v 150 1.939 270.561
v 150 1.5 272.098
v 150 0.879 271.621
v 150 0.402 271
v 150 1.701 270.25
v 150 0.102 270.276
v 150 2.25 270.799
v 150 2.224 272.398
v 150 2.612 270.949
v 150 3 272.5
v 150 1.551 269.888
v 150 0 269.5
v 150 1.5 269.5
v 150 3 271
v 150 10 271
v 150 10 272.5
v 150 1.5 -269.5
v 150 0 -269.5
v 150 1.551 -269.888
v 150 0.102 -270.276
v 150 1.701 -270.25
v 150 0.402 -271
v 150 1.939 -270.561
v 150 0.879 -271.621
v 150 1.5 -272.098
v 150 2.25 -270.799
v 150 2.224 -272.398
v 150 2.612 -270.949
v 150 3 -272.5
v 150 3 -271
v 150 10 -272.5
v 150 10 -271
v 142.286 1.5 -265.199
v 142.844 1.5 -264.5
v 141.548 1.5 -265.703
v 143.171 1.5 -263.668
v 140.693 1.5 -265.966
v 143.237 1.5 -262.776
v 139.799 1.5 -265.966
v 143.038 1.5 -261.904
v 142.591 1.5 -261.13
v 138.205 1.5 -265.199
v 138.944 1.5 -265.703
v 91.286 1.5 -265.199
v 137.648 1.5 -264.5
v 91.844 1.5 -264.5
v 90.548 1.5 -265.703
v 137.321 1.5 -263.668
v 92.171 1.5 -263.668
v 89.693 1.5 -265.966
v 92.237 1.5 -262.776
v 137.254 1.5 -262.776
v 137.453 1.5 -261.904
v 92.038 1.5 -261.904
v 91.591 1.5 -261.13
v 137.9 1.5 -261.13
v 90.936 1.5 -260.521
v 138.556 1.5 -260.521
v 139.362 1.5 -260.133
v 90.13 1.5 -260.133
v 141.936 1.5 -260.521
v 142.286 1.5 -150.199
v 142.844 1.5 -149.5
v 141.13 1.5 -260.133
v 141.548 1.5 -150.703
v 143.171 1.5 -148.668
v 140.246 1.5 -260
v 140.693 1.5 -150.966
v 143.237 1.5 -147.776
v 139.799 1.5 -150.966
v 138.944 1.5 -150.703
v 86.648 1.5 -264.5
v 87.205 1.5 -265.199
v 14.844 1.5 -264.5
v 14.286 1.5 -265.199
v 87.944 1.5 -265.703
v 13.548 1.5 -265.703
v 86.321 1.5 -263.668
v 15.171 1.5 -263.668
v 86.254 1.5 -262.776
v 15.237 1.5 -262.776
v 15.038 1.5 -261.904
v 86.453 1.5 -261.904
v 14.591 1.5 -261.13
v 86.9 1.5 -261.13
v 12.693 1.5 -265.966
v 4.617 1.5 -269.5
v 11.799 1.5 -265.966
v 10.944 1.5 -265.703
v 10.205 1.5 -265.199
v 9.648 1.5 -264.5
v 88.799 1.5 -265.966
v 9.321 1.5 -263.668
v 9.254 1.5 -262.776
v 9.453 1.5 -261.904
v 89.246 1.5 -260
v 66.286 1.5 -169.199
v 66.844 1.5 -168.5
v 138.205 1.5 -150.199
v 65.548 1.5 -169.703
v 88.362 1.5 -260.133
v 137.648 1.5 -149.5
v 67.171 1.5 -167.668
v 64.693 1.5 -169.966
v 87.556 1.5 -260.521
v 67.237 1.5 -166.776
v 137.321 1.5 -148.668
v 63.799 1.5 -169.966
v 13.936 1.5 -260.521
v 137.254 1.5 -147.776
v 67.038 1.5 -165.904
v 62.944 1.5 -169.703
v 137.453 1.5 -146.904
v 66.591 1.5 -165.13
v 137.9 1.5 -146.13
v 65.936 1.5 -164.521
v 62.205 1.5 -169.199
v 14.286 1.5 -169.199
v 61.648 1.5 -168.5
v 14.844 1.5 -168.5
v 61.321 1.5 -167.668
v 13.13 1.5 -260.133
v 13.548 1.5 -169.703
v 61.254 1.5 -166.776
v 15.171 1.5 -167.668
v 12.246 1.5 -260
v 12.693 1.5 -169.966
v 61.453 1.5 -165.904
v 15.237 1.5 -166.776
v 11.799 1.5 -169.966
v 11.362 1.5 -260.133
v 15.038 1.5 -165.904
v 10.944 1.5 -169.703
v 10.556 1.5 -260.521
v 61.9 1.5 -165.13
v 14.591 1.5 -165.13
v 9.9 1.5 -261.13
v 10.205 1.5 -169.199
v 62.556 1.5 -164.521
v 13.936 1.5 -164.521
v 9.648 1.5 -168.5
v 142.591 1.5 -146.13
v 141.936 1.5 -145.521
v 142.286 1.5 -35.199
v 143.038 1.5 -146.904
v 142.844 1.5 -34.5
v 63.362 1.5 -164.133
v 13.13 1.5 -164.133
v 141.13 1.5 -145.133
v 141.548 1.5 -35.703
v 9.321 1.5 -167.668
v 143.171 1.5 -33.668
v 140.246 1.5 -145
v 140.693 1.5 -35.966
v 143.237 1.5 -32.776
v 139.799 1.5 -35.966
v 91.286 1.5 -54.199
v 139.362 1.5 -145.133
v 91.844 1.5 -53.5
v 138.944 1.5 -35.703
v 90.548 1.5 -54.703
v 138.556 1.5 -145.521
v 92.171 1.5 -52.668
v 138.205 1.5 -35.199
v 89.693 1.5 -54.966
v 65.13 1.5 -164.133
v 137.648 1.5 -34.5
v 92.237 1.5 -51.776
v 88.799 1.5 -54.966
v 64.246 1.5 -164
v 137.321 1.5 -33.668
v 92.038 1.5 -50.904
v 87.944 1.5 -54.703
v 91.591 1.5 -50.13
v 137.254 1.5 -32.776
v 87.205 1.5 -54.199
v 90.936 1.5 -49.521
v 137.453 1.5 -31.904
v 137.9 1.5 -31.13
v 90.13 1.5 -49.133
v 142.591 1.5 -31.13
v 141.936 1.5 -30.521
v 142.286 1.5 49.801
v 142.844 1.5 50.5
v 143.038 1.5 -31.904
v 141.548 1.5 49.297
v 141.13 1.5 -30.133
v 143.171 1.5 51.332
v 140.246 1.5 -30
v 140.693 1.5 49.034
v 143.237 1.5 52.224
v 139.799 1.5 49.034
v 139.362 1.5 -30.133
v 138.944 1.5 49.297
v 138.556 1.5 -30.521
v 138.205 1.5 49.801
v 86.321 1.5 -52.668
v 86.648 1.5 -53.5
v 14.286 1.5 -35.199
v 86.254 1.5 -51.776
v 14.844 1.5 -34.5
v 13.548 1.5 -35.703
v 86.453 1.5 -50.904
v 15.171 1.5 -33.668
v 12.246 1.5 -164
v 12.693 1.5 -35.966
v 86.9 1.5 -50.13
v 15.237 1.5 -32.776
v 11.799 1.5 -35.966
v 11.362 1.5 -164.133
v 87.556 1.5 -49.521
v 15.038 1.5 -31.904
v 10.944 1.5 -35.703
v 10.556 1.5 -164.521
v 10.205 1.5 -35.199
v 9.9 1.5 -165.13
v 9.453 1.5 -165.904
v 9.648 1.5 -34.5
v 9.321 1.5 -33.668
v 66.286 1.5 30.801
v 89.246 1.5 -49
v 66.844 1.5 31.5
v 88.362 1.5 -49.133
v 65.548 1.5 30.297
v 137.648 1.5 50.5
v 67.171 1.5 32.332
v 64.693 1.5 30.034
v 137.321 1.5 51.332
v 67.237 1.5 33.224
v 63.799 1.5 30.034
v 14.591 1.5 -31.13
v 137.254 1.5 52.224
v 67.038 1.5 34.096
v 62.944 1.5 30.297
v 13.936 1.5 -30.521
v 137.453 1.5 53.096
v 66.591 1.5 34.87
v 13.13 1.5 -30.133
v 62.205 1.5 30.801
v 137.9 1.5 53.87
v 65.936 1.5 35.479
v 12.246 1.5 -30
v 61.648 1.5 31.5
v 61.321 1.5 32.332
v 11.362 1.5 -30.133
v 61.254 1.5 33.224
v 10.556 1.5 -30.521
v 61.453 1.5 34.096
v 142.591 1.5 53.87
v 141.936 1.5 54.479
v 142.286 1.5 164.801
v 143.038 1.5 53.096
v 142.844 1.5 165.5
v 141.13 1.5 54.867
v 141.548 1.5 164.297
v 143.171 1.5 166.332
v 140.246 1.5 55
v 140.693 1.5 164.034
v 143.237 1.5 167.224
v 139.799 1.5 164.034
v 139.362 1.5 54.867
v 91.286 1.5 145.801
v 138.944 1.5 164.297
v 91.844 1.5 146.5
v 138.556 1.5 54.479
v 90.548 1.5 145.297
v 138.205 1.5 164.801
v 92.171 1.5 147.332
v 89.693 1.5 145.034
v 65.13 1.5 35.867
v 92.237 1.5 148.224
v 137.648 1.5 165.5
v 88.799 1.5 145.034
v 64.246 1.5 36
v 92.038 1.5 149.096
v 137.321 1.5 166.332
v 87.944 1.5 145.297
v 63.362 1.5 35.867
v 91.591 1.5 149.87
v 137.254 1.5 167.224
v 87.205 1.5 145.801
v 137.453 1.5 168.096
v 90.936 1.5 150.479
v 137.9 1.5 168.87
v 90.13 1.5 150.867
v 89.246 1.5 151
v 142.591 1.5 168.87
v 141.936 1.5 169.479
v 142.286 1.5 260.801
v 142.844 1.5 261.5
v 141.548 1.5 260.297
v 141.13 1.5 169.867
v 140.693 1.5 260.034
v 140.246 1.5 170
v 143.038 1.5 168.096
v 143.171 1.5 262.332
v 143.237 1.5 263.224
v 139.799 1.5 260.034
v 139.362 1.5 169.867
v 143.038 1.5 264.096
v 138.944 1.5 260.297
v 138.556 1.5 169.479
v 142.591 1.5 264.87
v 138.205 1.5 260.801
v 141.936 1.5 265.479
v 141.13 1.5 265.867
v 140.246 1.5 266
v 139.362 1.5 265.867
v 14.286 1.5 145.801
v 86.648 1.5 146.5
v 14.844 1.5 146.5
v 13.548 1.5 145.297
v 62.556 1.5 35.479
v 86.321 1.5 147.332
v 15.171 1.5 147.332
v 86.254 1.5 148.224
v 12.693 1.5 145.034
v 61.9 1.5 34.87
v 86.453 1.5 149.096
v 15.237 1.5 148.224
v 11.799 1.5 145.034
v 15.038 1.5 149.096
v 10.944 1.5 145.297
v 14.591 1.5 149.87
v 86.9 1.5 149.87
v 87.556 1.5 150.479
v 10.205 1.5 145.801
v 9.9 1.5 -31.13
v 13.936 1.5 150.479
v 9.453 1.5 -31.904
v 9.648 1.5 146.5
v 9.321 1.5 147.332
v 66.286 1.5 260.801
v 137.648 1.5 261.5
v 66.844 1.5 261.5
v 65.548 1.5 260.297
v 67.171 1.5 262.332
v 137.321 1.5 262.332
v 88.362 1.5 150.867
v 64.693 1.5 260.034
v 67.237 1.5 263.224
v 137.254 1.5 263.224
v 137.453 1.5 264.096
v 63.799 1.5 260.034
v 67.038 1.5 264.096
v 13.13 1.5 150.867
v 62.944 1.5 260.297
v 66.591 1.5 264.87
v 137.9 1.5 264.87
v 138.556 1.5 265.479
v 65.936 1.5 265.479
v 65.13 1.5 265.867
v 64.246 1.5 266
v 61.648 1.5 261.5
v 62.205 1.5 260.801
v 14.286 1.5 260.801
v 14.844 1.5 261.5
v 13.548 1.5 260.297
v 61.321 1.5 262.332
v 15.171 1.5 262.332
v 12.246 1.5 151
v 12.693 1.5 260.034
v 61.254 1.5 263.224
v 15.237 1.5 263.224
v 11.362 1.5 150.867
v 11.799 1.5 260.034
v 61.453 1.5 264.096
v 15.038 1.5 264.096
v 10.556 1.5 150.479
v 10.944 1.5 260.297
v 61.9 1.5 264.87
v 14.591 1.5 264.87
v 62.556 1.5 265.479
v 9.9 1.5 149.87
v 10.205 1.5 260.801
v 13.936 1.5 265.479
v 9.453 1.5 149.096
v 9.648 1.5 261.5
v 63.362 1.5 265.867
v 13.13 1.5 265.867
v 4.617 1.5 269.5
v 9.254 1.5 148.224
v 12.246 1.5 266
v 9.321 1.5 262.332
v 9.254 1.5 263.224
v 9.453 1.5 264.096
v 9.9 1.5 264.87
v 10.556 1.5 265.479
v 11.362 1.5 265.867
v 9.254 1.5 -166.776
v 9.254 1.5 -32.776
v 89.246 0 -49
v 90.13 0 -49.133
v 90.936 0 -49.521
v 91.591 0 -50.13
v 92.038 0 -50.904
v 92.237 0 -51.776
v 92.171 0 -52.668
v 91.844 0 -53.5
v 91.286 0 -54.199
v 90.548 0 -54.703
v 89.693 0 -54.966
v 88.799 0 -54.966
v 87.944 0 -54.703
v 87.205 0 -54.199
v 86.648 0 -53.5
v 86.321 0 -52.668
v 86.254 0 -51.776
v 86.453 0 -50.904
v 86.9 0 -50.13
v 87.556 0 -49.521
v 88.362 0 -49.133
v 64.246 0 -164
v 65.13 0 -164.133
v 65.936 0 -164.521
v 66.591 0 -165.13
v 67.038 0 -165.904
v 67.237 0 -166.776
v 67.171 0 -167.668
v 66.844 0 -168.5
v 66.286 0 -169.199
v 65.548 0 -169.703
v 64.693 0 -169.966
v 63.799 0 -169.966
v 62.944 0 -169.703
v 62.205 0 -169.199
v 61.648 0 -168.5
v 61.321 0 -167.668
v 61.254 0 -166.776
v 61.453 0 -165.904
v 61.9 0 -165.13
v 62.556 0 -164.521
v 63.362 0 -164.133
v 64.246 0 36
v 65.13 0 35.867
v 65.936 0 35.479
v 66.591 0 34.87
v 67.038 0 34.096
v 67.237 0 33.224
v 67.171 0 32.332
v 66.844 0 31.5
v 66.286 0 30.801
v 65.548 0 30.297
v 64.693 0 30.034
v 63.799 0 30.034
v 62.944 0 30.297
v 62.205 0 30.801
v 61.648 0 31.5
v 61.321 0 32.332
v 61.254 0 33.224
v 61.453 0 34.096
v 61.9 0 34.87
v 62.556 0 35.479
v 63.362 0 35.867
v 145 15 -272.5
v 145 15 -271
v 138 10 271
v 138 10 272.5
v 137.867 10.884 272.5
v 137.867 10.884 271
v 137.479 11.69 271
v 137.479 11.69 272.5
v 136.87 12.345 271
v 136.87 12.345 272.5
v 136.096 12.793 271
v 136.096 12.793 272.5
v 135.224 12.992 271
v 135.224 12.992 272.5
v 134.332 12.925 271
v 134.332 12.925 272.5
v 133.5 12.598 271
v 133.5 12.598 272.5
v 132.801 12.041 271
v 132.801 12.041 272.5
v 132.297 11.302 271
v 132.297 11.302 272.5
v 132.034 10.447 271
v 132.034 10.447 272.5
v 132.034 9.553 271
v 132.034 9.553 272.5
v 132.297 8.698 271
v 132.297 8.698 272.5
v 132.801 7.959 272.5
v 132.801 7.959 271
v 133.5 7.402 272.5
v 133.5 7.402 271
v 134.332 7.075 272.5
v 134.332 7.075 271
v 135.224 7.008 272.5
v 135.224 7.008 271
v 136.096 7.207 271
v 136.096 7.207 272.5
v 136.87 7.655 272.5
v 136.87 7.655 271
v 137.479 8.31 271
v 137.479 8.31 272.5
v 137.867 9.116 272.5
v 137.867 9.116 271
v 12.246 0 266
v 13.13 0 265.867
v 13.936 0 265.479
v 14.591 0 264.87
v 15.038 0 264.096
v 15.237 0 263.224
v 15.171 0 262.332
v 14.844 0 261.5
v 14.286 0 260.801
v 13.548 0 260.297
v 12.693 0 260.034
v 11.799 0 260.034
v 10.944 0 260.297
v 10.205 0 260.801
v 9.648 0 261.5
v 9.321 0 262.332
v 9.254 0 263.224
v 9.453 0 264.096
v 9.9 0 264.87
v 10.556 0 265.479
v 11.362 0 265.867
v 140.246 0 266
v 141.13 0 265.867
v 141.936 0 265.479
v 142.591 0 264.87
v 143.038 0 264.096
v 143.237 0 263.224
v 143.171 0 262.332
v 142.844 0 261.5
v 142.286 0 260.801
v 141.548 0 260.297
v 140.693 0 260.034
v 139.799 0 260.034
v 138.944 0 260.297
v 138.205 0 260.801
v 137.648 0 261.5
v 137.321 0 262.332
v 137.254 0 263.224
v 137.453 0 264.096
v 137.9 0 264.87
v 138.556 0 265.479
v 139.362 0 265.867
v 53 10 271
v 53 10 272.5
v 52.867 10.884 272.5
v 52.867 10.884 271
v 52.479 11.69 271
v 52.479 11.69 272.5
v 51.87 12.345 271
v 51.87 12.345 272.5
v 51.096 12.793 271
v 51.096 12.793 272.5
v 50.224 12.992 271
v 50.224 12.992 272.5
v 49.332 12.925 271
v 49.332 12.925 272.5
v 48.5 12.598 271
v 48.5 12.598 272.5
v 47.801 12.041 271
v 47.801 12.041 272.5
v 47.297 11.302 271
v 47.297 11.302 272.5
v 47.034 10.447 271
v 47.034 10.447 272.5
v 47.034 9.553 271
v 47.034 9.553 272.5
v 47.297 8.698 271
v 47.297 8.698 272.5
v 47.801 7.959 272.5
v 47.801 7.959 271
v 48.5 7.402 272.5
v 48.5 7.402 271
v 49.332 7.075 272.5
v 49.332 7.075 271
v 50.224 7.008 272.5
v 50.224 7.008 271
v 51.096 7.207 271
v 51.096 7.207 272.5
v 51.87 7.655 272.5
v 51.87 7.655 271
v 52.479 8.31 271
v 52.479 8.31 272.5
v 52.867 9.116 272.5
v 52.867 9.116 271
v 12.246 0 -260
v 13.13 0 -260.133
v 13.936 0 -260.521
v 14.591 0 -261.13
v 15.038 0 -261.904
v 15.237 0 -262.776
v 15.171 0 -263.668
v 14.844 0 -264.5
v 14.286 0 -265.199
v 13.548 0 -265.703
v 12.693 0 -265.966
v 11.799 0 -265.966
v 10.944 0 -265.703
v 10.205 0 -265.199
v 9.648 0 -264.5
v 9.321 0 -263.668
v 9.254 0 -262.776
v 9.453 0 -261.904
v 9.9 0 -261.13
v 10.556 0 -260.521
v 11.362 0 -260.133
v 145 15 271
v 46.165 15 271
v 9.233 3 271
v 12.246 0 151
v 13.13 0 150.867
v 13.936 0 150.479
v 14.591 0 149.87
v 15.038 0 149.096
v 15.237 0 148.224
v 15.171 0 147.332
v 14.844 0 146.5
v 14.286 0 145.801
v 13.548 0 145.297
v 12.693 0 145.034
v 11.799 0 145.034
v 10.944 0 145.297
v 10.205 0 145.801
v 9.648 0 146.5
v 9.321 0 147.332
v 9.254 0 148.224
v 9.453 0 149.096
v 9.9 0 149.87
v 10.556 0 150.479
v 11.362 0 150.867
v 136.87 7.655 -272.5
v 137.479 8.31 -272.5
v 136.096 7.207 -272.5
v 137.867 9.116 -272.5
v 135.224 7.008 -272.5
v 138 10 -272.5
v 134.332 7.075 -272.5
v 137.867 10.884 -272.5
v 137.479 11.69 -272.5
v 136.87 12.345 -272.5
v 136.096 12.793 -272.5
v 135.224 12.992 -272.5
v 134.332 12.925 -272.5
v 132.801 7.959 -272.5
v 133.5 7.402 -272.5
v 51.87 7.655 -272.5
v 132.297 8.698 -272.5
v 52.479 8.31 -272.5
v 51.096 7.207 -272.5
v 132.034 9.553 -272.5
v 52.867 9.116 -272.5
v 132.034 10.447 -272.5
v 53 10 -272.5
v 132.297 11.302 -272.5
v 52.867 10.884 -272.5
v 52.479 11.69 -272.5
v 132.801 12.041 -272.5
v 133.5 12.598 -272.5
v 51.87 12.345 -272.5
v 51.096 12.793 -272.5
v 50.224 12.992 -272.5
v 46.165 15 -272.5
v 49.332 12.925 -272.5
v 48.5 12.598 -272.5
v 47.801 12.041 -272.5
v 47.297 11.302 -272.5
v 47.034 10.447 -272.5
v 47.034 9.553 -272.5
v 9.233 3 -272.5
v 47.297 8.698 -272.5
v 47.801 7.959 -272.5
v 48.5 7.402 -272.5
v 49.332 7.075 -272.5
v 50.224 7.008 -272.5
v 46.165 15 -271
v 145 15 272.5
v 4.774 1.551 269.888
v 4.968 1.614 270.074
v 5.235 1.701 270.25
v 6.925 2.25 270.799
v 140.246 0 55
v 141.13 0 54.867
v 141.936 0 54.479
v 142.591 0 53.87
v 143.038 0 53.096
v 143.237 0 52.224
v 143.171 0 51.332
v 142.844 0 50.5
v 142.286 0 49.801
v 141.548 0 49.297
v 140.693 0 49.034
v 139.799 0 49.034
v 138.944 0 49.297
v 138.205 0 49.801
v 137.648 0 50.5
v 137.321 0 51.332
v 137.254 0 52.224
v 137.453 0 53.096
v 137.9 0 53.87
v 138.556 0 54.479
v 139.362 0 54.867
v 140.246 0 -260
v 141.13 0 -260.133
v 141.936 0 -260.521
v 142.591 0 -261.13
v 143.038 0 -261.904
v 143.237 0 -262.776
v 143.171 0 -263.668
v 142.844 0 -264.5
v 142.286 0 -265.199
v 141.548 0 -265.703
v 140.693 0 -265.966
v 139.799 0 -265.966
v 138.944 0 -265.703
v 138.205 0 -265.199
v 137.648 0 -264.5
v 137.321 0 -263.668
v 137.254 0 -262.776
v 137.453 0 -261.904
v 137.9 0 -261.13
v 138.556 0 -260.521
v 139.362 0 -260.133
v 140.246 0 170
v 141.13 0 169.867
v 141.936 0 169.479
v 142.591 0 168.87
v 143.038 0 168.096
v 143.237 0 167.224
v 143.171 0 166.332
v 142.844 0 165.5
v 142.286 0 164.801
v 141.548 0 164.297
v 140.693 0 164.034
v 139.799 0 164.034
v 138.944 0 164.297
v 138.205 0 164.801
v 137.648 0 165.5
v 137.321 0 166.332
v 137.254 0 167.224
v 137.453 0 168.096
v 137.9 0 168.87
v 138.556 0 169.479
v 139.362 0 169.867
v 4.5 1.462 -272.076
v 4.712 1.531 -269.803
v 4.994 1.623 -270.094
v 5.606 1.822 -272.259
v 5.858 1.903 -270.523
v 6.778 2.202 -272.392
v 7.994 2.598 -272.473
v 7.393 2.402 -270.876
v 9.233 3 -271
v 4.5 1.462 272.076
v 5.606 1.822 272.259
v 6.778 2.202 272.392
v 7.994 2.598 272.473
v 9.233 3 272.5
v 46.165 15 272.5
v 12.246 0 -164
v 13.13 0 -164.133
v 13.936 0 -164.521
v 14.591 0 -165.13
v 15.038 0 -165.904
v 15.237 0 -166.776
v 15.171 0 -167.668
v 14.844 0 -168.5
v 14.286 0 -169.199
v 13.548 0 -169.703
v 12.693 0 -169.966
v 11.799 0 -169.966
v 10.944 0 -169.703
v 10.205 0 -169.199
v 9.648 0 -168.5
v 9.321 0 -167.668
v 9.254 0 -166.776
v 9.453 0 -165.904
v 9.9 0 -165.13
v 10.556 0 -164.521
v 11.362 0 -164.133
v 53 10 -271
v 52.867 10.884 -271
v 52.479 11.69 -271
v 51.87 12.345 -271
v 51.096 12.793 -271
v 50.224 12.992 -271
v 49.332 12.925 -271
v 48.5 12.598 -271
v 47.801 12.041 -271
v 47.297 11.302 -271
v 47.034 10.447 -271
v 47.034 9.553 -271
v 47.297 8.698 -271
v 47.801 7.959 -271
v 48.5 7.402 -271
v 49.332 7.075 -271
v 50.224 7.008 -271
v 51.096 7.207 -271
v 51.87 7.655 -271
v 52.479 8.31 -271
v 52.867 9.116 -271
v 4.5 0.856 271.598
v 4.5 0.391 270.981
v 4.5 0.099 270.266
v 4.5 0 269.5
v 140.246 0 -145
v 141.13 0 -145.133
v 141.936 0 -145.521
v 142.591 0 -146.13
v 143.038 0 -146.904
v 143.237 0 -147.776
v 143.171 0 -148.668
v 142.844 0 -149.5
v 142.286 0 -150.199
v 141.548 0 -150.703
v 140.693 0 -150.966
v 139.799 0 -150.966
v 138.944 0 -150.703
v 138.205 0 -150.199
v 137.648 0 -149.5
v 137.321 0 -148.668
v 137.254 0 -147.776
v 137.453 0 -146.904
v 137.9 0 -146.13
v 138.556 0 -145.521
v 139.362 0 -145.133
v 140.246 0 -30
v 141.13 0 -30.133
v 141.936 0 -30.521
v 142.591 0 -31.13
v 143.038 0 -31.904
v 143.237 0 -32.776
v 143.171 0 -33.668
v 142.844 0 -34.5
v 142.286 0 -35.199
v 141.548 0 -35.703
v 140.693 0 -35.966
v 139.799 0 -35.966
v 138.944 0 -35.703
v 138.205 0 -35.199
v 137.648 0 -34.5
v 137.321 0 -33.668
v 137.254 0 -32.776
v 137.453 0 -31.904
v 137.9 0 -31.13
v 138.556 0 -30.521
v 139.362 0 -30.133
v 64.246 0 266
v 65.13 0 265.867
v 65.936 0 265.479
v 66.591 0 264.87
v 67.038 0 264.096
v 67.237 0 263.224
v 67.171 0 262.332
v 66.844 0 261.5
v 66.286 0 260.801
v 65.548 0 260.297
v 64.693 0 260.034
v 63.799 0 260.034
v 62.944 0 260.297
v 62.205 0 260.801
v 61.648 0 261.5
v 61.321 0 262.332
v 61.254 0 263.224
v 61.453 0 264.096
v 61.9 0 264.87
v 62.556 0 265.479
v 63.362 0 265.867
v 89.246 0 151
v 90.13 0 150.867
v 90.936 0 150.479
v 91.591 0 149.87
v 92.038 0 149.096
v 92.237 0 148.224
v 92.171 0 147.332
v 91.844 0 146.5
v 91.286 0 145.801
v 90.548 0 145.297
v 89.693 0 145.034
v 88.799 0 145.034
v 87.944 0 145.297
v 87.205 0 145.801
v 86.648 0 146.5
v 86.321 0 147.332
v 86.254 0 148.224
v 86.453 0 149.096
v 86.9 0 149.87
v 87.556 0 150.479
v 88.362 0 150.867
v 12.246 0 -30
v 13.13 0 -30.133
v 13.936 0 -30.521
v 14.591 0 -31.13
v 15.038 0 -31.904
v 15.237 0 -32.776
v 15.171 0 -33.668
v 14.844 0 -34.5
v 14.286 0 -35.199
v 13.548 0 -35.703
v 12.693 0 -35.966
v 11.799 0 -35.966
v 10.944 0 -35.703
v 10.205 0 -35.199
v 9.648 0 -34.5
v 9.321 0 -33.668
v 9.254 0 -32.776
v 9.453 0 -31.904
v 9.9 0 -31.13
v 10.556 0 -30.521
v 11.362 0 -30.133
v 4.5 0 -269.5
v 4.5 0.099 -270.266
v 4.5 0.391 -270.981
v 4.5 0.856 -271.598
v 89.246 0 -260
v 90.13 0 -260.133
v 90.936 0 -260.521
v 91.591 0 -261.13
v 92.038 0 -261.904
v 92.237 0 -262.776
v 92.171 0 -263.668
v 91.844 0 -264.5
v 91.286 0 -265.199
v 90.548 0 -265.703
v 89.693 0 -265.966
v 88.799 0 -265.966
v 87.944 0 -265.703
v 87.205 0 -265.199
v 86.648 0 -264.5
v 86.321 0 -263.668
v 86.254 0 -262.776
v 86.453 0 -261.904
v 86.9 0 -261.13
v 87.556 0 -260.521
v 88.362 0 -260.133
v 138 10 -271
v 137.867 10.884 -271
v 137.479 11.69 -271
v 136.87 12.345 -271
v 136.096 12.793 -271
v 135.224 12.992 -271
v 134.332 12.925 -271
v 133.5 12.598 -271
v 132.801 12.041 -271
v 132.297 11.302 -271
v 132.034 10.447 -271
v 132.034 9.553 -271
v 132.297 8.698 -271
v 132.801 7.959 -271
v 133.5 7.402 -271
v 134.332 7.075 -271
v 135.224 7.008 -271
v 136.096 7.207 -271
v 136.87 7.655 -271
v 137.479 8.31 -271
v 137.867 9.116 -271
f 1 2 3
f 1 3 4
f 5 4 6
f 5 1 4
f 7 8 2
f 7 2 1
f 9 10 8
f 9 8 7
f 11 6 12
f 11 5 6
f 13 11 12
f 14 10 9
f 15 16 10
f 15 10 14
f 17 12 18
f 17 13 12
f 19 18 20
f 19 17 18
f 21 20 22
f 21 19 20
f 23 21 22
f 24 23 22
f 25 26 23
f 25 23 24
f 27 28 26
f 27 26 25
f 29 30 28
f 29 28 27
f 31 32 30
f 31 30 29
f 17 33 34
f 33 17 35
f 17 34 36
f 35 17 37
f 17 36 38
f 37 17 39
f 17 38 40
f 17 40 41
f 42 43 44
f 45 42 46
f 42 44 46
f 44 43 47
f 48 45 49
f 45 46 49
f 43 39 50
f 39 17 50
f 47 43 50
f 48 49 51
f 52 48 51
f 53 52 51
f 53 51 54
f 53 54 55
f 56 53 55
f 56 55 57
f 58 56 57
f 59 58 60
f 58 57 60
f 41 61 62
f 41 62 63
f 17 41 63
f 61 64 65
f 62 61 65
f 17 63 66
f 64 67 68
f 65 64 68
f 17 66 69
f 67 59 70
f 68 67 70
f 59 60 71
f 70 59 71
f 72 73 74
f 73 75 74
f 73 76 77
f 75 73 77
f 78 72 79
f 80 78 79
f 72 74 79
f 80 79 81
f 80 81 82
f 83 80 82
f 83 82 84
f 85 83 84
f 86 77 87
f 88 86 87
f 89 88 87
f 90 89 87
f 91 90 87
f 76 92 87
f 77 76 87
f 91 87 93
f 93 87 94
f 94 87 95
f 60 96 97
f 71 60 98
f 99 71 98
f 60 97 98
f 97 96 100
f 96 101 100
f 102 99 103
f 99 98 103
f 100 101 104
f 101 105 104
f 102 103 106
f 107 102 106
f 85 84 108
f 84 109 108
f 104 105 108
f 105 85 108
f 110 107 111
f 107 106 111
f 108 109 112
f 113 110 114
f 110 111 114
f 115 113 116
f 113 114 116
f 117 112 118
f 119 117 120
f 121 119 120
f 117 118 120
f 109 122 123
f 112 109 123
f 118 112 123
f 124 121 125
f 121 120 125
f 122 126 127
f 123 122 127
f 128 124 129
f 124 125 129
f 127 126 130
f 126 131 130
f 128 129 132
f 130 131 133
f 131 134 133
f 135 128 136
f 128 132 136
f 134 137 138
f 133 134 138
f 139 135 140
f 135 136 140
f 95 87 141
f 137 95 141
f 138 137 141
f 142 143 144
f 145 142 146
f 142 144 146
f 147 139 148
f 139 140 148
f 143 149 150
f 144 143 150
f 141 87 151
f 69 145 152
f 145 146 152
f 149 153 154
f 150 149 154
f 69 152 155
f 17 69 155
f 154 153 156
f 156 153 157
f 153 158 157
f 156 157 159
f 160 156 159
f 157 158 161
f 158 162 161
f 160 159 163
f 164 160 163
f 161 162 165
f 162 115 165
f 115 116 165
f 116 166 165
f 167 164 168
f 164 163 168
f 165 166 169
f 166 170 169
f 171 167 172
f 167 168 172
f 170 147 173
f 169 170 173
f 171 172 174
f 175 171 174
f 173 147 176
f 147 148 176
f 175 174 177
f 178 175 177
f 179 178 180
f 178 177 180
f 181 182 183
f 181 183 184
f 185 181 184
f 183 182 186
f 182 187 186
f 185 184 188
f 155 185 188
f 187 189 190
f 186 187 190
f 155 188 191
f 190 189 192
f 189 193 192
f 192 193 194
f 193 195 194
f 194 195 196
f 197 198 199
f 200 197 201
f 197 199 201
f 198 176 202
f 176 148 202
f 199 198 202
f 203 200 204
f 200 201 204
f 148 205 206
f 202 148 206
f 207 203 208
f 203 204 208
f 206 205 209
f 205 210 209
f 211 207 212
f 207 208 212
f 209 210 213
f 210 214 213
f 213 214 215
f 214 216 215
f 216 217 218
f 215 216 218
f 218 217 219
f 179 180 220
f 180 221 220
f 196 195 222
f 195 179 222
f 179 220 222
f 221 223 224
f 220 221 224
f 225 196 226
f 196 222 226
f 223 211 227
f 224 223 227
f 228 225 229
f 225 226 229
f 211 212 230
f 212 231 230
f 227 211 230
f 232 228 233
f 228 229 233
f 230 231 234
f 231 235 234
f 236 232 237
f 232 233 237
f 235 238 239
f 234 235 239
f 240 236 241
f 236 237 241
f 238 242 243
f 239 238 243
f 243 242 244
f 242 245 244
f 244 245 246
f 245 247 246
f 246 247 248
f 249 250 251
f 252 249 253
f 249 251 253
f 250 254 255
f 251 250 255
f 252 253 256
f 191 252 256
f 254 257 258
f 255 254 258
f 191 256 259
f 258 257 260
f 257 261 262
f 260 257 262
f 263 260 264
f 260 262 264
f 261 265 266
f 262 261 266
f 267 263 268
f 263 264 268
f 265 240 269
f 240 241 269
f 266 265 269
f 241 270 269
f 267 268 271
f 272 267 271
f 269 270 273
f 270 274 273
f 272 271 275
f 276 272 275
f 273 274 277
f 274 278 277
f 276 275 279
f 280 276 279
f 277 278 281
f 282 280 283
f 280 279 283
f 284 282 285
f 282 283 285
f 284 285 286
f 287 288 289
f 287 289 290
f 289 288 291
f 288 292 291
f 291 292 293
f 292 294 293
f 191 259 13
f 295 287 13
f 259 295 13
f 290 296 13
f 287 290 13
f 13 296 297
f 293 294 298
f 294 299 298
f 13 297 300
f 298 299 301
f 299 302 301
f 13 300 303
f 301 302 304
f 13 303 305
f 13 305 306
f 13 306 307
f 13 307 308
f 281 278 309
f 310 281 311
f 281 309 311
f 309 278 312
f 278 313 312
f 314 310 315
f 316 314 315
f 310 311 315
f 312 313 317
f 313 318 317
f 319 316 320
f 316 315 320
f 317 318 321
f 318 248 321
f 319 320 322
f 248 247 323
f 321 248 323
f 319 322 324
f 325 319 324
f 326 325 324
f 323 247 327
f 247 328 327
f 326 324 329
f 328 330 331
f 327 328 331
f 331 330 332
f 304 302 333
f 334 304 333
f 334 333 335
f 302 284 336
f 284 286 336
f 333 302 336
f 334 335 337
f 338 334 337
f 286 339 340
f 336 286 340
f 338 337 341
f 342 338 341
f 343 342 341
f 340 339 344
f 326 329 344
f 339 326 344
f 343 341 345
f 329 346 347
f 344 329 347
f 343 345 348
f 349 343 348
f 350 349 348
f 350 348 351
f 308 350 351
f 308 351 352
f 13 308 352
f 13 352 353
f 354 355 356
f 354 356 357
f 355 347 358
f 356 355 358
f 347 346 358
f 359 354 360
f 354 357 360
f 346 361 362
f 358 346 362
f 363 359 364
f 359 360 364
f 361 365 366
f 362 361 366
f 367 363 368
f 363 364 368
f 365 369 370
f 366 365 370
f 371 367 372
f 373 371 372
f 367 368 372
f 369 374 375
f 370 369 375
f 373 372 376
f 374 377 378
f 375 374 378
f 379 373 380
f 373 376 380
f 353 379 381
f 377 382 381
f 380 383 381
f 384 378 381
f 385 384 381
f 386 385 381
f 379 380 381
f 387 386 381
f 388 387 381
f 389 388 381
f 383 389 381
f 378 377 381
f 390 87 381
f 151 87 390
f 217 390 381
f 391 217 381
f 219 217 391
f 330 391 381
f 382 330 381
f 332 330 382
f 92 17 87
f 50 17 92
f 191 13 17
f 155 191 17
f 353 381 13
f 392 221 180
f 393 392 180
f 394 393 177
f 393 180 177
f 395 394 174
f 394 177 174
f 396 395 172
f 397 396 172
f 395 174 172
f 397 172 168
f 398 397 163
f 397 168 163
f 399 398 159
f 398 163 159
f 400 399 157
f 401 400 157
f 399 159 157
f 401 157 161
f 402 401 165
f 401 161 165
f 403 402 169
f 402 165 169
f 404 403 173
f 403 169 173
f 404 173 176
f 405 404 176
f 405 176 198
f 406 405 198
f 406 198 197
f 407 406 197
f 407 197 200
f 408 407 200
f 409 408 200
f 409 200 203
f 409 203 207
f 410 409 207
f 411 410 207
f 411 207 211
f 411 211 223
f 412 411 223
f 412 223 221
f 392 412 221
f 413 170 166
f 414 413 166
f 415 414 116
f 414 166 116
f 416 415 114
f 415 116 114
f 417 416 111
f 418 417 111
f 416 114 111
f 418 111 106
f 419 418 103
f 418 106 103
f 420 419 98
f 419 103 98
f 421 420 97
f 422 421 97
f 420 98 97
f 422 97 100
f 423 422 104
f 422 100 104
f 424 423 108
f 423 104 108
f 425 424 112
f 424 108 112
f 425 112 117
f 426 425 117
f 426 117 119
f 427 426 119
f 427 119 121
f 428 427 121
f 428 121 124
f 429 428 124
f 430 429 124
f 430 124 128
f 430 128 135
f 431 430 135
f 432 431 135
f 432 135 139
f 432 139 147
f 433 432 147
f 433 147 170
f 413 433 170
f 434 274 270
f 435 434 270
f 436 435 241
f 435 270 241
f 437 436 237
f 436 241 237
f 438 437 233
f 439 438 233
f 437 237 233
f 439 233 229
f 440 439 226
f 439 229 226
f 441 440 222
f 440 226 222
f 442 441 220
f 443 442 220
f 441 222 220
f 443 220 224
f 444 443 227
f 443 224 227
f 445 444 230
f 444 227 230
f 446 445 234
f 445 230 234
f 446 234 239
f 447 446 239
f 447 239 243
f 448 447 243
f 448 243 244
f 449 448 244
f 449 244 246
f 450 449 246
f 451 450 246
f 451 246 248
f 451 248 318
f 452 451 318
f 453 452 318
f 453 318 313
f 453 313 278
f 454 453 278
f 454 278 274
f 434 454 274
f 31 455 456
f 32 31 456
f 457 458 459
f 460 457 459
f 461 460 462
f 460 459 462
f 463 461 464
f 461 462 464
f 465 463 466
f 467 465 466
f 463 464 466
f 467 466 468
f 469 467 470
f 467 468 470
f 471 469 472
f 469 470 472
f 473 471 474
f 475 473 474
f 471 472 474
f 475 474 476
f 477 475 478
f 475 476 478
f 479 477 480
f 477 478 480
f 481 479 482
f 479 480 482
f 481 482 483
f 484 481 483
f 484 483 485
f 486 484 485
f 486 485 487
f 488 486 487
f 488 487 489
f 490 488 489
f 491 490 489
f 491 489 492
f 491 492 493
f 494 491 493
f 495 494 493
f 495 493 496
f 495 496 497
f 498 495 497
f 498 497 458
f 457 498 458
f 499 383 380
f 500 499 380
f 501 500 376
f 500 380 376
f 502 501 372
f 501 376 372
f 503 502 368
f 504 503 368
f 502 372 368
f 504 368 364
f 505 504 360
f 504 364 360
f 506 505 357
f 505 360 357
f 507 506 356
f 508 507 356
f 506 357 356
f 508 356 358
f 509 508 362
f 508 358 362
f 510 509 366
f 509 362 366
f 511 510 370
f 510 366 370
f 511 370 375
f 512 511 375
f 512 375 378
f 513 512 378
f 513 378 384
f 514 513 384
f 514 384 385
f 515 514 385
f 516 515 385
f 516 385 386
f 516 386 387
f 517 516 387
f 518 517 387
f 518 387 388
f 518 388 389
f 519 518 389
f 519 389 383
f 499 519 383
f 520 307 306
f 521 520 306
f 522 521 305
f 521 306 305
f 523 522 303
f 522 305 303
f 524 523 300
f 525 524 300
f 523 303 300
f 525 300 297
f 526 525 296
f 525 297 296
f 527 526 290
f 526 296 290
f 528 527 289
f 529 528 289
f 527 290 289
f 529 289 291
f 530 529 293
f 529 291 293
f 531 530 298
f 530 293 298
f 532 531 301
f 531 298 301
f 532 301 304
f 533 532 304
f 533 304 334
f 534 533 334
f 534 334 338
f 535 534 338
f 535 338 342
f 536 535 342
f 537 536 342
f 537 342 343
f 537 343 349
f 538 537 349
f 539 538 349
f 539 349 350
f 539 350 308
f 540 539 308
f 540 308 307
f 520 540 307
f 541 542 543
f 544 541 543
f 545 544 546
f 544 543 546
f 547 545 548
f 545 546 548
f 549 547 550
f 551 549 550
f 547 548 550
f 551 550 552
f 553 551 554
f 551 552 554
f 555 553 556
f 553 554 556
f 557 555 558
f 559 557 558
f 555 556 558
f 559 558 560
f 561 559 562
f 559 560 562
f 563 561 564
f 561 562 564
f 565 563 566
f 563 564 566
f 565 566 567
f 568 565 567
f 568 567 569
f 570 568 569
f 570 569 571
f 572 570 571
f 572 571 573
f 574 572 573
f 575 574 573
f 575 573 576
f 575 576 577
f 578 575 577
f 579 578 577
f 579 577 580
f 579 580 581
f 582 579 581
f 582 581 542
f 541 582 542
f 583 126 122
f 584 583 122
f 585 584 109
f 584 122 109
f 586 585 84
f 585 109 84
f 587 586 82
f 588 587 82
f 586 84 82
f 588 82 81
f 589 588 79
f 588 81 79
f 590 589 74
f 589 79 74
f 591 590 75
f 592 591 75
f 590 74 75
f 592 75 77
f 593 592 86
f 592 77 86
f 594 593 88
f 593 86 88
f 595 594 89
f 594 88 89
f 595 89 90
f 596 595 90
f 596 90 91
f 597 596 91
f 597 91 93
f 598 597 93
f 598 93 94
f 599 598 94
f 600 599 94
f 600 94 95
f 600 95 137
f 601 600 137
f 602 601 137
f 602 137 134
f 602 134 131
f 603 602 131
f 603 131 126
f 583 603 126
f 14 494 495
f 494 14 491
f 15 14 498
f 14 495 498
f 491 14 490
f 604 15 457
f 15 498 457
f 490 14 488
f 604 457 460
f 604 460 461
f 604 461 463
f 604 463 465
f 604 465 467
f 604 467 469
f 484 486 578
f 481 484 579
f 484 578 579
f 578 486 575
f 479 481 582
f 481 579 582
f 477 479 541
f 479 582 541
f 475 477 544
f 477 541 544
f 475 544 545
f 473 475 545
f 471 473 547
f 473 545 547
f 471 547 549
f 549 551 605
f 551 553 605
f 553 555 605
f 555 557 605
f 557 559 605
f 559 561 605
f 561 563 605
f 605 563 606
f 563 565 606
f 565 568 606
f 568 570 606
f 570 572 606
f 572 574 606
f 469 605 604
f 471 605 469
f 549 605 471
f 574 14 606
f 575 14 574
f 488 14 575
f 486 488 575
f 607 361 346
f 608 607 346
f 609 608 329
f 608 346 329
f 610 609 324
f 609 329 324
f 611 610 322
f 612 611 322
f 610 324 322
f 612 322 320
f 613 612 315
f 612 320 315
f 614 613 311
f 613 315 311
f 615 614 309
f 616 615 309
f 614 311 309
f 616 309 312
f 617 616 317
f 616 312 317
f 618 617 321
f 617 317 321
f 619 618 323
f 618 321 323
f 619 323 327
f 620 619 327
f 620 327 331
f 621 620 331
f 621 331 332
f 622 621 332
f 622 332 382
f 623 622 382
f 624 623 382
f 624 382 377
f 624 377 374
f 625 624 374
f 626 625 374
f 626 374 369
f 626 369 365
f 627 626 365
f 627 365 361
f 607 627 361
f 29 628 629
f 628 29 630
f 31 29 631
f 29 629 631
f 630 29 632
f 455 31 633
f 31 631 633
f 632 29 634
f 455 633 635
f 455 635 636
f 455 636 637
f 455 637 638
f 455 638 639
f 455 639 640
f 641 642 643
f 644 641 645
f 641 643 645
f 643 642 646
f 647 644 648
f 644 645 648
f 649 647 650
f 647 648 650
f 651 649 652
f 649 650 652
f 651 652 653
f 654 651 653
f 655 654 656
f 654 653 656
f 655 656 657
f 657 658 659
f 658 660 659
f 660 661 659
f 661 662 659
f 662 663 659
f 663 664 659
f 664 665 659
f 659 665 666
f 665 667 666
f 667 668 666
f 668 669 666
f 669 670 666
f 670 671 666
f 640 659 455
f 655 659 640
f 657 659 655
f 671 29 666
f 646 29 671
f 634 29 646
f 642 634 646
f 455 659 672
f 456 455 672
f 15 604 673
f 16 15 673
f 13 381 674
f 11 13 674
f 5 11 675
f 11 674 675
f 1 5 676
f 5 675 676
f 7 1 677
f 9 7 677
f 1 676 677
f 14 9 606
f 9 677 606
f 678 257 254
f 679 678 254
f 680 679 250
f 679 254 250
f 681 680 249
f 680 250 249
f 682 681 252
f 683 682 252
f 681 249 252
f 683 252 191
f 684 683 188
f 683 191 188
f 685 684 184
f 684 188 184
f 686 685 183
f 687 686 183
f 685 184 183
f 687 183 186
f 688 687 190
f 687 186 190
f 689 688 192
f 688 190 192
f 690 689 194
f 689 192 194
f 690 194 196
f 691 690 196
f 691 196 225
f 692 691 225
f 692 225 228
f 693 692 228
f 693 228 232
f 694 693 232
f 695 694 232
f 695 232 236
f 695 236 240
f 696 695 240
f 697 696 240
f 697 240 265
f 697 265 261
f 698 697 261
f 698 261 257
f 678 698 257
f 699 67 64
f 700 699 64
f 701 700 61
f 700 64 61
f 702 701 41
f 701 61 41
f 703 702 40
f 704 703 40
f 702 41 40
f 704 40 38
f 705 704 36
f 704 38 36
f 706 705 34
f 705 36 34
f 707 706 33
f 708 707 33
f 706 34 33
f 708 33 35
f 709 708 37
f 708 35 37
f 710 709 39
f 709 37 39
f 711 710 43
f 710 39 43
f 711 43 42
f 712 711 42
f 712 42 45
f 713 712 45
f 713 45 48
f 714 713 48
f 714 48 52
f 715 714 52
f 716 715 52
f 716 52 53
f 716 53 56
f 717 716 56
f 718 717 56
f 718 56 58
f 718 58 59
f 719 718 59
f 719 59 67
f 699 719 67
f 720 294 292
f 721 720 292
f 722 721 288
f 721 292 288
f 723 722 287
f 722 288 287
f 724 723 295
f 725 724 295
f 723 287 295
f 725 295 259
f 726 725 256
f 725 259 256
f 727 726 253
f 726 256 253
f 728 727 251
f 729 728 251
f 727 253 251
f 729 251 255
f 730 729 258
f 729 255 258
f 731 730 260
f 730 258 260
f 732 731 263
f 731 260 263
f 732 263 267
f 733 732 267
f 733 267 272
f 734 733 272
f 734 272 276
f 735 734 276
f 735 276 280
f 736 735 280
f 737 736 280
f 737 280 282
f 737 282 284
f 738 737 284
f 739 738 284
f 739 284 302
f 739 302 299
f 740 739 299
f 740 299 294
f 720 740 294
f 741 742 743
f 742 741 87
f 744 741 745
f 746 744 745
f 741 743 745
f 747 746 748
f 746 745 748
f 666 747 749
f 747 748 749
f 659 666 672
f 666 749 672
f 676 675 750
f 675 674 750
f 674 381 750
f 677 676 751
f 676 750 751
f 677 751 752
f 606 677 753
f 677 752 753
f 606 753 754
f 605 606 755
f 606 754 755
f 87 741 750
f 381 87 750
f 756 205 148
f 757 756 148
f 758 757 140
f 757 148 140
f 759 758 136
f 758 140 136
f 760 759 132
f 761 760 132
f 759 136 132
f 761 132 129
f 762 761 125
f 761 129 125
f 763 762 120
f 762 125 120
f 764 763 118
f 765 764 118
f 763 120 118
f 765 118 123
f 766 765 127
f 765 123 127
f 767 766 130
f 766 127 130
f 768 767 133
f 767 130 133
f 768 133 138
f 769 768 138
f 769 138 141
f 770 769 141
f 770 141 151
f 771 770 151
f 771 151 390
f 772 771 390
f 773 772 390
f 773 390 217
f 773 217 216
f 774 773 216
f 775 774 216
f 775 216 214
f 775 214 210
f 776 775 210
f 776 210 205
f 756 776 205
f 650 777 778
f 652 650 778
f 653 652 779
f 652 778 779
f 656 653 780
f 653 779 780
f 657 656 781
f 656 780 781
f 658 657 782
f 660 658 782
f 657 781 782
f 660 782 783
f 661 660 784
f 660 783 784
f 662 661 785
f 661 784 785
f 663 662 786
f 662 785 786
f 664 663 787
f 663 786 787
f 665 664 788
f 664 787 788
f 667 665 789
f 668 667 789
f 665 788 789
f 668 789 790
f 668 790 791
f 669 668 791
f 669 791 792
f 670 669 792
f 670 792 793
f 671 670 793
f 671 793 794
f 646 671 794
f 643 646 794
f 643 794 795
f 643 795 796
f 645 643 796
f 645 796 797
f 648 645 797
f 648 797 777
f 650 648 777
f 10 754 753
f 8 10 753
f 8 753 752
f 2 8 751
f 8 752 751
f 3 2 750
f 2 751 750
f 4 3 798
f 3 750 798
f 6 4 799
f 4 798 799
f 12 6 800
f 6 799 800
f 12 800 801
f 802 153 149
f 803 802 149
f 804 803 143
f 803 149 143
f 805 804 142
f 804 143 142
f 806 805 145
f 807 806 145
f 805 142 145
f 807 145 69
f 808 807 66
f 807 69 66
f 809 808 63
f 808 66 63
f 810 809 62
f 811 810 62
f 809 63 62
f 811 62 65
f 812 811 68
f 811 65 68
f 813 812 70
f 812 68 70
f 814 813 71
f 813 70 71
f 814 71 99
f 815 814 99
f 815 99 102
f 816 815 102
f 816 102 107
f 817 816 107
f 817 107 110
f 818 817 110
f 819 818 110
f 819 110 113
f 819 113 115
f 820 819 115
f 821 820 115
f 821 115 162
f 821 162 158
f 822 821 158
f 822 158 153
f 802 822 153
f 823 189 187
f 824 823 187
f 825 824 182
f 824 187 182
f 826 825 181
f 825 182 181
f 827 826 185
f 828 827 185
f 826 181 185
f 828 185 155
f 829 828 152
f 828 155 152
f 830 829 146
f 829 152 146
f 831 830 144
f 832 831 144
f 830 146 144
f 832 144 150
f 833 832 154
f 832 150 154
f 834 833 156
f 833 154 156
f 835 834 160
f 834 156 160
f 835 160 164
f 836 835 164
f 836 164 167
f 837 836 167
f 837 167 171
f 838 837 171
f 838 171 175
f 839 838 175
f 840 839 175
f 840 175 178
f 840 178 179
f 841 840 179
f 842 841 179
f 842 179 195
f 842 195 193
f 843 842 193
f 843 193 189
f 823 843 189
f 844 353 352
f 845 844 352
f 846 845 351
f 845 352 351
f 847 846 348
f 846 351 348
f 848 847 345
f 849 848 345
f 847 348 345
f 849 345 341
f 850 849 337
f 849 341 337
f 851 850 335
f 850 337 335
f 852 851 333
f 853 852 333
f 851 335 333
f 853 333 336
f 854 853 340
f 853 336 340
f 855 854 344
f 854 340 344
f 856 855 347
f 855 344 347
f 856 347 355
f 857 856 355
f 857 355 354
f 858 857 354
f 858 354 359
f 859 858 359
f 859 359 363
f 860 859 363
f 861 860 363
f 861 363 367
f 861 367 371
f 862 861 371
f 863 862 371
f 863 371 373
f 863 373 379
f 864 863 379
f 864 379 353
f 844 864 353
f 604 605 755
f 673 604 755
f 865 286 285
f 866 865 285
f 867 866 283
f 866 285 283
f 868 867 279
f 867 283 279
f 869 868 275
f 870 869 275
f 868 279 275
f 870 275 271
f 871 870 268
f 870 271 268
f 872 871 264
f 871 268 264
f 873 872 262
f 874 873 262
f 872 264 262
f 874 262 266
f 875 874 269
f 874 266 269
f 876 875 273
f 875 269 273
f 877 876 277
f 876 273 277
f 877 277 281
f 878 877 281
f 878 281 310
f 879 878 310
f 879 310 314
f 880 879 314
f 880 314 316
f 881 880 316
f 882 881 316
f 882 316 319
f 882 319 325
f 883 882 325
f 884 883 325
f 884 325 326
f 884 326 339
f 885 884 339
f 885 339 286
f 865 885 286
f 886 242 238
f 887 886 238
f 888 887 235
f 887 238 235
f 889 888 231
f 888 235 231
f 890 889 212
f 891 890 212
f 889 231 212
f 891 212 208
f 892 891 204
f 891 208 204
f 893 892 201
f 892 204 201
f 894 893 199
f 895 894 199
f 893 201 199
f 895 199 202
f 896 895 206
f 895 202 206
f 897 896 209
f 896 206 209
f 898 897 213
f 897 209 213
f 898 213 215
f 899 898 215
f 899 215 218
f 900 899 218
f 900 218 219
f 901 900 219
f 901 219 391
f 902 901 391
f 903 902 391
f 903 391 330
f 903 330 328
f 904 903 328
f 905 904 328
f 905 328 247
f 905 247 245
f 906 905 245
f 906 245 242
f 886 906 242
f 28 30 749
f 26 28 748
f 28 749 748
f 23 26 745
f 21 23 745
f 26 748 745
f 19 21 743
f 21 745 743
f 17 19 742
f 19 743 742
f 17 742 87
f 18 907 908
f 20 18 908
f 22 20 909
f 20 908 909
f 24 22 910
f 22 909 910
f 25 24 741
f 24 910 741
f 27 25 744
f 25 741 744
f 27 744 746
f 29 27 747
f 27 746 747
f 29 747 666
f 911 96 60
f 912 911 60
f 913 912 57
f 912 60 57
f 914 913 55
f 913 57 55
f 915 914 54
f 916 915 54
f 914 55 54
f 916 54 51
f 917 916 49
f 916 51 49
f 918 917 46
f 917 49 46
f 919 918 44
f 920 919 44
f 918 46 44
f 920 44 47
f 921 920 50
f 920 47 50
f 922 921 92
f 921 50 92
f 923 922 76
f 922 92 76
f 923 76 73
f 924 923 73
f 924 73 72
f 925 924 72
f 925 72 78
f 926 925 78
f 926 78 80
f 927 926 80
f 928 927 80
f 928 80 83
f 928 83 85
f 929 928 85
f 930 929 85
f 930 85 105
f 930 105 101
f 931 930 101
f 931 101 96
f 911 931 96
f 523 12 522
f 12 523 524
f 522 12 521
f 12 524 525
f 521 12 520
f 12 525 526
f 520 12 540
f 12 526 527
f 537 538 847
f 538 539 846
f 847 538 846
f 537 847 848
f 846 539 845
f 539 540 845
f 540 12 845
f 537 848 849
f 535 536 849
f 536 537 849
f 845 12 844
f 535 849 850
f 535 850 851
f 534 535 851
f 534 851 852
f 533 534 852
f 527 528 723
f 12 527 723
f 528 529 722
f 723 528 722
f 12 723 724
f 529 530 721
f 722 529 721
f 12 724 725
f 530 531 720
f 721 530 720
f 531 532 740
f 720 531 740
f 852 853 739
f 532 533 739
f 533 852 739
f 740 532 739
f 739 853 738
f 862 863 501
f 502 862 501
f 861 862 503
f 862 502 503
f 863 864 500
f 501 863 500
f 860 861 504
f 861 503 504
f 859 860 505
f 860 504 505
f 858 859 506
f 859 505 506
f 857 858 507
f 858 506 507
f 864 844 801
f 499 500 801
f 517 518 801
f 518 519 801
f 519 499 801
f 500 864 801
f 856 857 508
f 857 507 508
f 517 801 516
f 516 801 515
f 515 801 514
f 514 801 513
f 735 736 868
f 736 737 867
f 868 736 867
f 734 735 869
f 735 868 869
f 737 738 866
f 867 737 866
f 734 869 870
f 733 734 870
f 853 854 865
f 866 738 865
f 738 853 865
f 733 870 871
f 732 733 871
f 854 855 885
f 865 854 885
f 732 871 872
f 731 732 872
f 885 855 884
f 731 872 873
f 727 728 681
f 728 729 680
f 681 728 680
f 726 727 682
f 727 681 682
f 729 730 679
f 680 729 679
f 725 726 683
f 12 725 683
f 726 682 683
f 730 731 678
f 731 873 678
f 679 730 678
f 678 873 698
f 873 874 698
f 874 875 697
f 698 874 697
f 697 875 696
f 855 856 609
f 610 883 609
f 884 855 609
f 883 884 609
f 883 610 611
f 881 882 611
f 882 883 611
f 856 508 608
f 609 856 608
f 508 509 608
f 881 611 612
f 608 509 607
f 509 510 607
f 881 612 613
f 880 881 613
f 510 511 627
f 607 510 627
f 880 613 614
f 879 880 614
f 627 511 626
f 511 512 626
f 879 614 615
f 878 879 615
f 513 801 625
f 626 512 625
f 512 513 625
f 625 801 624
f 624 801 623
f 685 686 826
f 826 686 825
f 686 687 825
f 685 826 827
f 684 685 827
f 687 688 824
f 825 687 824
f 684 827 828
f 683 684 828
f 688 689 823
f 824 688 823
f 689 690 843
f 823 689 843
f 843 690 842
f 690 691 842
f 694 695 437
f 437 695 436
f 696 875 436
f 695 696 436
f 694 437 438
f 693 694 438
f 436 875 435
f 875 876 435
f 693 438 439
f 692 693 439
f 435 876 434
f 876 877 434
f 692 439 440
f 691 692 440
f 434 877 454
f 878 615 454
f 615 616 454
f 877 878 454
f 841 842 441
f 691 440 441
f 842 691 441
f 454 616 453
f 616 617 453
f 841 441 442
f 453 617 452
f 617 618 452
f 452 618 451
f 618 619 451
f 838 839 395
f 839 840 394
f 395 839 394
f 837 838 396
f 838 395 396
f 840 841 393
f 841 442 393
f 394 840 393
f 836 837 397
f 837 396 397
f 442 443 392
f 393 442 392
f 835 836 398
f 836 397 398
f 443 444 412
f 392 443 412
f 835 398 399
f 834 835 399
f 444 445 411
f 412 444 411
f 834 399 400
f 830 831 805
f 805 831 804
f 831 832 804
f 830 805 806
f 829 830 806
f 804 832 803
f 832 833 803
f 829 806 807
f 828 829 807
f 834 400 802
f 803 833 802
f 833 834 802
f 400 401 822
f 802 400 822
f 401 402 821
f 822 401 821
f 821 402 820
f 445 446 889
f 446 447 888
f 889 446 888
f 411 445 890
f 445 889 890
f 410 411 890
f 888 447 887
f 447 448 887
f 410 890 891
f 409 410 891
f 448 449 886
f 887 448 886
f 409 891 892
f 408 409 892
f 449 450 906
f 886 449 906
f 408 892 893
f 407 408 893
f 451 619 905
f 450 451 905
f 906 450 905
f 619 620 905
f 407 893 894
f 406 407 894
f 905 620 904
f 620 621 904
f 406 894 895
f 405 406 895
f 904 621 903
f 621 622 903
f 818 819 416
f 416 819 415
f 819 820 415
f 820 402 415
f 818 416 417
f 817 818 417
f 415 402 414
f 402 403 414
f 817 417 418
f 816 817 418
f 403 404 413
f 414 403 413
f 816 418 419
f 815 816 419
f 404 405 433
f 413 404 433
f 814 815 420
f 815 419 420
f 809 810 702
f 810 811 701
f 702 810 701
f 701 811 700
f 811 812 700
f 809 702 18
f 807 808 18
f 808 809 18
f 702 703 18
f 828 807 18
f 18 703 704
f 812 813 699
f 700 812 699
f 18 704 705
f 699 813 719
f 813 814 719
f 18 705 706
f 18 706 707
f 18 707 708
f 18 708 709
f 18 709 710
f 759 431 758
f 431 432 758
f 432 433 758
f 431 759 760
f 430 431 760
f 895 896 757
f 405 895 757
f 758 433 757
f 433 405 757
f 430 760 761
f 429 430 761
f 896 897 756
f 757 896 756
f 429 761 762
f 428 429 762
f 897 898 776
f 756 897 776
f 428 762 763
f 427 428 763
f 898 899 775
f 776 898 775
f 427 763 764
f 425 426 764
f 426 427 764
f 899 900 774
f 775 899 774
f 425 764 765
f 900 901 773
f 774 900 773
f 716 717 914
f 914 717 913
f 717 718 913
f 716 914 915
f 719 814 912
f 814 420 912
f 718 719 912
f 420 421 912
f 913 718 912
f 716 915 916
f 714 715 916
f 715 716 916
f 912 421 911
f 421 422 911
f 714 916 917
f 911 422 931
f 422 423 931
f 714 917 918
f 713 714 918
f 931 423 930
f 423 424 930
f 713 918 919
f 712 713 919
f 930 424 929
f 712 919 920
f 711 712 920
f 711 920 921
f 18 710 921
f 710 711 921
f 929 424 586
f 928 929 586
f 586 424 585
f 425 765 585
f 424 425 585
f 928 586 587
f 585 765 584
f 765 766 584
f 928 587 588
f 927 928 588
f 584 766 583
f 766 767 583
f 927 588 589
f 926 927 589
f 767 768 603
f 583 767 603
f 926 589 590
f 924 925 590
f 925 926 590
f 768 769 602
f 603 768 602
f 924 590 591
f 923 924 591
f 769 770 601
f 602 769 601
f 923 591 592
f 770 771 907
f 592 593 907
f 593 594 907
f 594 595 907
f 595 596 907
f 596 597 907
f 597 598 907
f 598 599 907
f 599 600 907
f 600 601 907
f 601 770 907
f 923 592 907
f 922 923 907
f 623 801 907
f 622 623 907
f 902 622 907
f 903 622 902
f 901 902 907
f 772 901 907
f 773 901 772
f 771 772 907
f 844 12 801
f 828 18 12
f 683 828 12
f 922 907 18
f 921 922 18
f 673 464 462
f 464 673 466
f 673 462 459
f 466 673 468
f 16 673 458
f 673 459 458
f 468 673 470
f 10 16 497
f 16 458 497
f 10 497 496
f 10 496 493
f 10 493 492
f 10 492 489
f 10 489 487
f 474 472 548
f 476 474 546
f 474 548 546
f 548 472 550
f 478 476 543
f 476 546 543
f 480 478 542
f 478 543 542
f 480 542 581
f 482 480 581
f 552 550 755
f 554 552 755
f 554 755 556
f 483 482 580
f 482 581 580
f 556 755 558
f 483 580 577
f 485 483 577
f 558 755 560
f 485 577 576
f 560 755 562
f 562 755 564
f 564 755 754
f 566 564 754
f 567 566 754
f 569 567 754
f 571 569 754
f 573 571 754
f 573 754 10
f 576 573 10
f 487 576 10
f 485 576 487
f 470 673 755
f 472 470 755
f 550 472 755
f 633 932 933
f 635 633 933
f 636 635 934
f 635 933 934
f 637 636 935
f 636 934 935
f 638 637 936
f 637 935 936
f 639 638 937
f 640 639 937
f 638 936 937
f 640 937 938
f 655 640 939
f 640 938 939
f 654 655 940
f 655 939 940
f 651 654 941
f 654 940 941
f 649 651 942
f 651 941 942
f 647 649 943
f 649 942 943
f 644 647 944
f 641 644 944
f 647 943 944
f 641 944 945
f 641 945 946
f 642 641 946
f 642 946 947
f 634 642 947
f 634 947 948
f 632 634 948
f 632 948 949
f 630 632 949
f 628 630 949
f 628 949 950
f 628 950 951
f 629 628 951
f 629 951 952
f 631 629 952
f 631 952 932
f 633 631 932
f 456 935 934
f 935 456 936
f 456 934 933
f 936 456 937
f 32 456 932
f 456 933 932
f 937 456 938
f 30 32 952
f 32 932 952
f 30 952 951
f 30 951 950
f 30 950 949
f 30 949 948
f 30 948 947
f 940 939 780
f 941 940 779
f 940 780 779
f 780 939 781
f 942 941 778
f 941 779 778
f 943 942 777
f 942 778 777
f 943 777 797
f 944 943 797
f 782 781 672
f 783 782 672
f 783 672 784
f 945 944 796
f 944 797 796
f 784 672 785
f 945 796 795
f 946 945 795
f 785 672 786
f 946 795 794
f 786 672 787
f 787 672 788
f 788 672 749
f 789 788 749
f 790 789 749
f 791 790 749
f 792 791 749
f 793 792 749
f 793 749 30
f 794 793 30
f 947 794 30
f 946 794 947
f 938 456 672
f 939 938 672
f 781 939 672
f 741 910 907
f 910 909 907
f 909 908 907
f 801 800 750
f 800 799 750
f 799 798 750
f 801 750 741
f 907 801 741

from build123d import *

# Parameters (mm, degrees)
ESTRUSIONE_SOTTILE1_DEPTH = 150
SCHIZZO2_R                = 3
TAGLIO_ESTRUSIONE1_DEPTH  = 566.464410905
TAGLIO_ESTRUSIONE2_DEPTH  = 566.464410905
SCHIZZO4_R                = 3
TAGLIO_ESTRUSIONE3_DEPTH  = 10
SMUSSO1_SIZE              = 5


with BuildPart() as part:
    # Schizzo1 → Estrusione-Sottile1 (new body)
    with BuildSketch(Plane(origin=(0, 0, 0), x_dir=(0, 0, -1), z_dir=(1, 0, 0))):
        with BuildLine():
            Line((-272.5, 15), (-272.5, 3))
            ThreePointArc((-272.5, 3), (-271.621320344, 0.878679656), (-269.5, 0))
            Line((-269.5, 0), (269.5, 0))
            ThreePointArc((269.5, 0), (271.621320344, 0.878679656), (272.5, 3))
            Line((272.5, 3), (272.5, 15))
            Line((272.5, 15), (271, 15))
            Line((271, 15), (271, 3))
            ThreePointArc((271, 3), (270.560660172, 1.939339828), (269.5, 1.5))
            Line((269.5, 1.5), (-269.5, 1.5))
            ThreePointArc((-269.5, 1.5), (-270.560660172, 1.939339828), (-271, 3))
            Line((-271, 3), (-271, 15))
            Line((-271, 15), (-272.5, 15))
        make_face()
    extrude(amount=ESTRUSIONE_SOTTILE1_DEPTH)

    # Schizzo2 → Taglio-Estrusione1 (cut, through all)
    with BuildSketch(Plane.XY.offset(272.5)):
        with Locations((135, 10)):
            Circle(SCHIZZO2_R)
        with Locations((50, 10)):
            Circle(SCHIZZO2_R)
    extrude(amount=-TAGLIO_ESTRUSIONE1_DEPTH, mode=Mode.SUBTRACT)

    # Schizzo3 → Taglio-Estrusione2 (cut, through all)
    with BuildSketch(Plane.XY.offset(272.5)):
        Polygon((4.5, 1.462138633), (46.165253058, 15), (0, 15), (0, 0), (4.5, 0), align=None)
    extrude(amount=-TAGLIO_ESTRUSIONE2_DEPTH, mode=Mode.SUBTRACT)

    # Schizzo4 → Taglio-Estrusione3 (cut)
    with BuildSketch(Plane(origin=(0, 1.5, 0), x_dir=(1, 0, 0), z_dir=(0, 1, 0))):
        with Locations(Location((12.2458607, 33, 0), (0, 0, 270))):
            Circle(SCHIZZO4_R)
        with Locations(Location((12.2458607, 167, 0), (0, 0, 270))):
            Circle(SCHIZZO4_R)
        with Locations(Location((12.2458607, 263, 0), (0, 0, 270))):
            Circle(SCHIZZO4_R)
        with Locations(Location((12.2458607, -263, 0), (0, 0, 270))):
            Circle(SCHIZZO4_R)
        with Locations(Location((12.2458607, -148, 0), (0, 0, 270))):
            Circle(SCHIZZO4_R)
        with Locations(Location((64.2458607, 167, 0), (0, 0, 270))):
            Circle(SCHIZZO4_R)
        with Locations(Location((89.2458607, 52, 0), (0, 0, 270))):
            Circle(SCHIZZO4_R)
        with Locations(Location((64.2458607, -33, 0), (0, 0, 270))):
            Circle(SCHIZZO4_R)
        with Locations(Location((89.2458607, -148, 0), (0, 0, 270))):
            Circle(SCHIZZO4_R)
        with Locations(Location((64.2458607, -263, 0), (0, 0, 270))):
            Circle(SCHIZZO4_R)
        with Locations(Location((140.2458607, -167, 0), (0, 0, 270))):
            Circle(SCHIZZO4_R)
        with Locations(Location((140.2458607, -52, 0), (0, 0, 270))):
            Circle(SCHIZZO4_R)
        with Locations(Location((140.2458607, 33, 0), (0, 0, 270))):
            Circle(SCHIZZO4_R)
        with Locations(Location((140.2458607, 148, 0), (0, 0, 270))):
            Circle(SCHIZZO4_R)
        with Locations(Location((89.2458607, 263, 0), (0, 0, 270))):
            Circle(SCHIZZO4_R)
        with Locations(Location((140.2458607, 263, 0), (0, 0, 270))):
            Circle(SCHIZZO4_R)
        with Locations(Location((140.2458607, -263, 0), (0, 0, 270))):
            Circle(SCHIZZO4_R)
    extrude(amount=-TAGLIO_ESTRUSIONE3_DEPTH, mode=Mode.SUBTRACT)

    # Smusso1
    smusso1_edges = [part.edges().sort_by_distance(p)[0] for p in [
        (150, 15, -271.75),
        (150, 15, 271.75),
    ]]
    chamfer(smusso1_edges, length=SMUSSO1_SIZE)


solid = part.part
